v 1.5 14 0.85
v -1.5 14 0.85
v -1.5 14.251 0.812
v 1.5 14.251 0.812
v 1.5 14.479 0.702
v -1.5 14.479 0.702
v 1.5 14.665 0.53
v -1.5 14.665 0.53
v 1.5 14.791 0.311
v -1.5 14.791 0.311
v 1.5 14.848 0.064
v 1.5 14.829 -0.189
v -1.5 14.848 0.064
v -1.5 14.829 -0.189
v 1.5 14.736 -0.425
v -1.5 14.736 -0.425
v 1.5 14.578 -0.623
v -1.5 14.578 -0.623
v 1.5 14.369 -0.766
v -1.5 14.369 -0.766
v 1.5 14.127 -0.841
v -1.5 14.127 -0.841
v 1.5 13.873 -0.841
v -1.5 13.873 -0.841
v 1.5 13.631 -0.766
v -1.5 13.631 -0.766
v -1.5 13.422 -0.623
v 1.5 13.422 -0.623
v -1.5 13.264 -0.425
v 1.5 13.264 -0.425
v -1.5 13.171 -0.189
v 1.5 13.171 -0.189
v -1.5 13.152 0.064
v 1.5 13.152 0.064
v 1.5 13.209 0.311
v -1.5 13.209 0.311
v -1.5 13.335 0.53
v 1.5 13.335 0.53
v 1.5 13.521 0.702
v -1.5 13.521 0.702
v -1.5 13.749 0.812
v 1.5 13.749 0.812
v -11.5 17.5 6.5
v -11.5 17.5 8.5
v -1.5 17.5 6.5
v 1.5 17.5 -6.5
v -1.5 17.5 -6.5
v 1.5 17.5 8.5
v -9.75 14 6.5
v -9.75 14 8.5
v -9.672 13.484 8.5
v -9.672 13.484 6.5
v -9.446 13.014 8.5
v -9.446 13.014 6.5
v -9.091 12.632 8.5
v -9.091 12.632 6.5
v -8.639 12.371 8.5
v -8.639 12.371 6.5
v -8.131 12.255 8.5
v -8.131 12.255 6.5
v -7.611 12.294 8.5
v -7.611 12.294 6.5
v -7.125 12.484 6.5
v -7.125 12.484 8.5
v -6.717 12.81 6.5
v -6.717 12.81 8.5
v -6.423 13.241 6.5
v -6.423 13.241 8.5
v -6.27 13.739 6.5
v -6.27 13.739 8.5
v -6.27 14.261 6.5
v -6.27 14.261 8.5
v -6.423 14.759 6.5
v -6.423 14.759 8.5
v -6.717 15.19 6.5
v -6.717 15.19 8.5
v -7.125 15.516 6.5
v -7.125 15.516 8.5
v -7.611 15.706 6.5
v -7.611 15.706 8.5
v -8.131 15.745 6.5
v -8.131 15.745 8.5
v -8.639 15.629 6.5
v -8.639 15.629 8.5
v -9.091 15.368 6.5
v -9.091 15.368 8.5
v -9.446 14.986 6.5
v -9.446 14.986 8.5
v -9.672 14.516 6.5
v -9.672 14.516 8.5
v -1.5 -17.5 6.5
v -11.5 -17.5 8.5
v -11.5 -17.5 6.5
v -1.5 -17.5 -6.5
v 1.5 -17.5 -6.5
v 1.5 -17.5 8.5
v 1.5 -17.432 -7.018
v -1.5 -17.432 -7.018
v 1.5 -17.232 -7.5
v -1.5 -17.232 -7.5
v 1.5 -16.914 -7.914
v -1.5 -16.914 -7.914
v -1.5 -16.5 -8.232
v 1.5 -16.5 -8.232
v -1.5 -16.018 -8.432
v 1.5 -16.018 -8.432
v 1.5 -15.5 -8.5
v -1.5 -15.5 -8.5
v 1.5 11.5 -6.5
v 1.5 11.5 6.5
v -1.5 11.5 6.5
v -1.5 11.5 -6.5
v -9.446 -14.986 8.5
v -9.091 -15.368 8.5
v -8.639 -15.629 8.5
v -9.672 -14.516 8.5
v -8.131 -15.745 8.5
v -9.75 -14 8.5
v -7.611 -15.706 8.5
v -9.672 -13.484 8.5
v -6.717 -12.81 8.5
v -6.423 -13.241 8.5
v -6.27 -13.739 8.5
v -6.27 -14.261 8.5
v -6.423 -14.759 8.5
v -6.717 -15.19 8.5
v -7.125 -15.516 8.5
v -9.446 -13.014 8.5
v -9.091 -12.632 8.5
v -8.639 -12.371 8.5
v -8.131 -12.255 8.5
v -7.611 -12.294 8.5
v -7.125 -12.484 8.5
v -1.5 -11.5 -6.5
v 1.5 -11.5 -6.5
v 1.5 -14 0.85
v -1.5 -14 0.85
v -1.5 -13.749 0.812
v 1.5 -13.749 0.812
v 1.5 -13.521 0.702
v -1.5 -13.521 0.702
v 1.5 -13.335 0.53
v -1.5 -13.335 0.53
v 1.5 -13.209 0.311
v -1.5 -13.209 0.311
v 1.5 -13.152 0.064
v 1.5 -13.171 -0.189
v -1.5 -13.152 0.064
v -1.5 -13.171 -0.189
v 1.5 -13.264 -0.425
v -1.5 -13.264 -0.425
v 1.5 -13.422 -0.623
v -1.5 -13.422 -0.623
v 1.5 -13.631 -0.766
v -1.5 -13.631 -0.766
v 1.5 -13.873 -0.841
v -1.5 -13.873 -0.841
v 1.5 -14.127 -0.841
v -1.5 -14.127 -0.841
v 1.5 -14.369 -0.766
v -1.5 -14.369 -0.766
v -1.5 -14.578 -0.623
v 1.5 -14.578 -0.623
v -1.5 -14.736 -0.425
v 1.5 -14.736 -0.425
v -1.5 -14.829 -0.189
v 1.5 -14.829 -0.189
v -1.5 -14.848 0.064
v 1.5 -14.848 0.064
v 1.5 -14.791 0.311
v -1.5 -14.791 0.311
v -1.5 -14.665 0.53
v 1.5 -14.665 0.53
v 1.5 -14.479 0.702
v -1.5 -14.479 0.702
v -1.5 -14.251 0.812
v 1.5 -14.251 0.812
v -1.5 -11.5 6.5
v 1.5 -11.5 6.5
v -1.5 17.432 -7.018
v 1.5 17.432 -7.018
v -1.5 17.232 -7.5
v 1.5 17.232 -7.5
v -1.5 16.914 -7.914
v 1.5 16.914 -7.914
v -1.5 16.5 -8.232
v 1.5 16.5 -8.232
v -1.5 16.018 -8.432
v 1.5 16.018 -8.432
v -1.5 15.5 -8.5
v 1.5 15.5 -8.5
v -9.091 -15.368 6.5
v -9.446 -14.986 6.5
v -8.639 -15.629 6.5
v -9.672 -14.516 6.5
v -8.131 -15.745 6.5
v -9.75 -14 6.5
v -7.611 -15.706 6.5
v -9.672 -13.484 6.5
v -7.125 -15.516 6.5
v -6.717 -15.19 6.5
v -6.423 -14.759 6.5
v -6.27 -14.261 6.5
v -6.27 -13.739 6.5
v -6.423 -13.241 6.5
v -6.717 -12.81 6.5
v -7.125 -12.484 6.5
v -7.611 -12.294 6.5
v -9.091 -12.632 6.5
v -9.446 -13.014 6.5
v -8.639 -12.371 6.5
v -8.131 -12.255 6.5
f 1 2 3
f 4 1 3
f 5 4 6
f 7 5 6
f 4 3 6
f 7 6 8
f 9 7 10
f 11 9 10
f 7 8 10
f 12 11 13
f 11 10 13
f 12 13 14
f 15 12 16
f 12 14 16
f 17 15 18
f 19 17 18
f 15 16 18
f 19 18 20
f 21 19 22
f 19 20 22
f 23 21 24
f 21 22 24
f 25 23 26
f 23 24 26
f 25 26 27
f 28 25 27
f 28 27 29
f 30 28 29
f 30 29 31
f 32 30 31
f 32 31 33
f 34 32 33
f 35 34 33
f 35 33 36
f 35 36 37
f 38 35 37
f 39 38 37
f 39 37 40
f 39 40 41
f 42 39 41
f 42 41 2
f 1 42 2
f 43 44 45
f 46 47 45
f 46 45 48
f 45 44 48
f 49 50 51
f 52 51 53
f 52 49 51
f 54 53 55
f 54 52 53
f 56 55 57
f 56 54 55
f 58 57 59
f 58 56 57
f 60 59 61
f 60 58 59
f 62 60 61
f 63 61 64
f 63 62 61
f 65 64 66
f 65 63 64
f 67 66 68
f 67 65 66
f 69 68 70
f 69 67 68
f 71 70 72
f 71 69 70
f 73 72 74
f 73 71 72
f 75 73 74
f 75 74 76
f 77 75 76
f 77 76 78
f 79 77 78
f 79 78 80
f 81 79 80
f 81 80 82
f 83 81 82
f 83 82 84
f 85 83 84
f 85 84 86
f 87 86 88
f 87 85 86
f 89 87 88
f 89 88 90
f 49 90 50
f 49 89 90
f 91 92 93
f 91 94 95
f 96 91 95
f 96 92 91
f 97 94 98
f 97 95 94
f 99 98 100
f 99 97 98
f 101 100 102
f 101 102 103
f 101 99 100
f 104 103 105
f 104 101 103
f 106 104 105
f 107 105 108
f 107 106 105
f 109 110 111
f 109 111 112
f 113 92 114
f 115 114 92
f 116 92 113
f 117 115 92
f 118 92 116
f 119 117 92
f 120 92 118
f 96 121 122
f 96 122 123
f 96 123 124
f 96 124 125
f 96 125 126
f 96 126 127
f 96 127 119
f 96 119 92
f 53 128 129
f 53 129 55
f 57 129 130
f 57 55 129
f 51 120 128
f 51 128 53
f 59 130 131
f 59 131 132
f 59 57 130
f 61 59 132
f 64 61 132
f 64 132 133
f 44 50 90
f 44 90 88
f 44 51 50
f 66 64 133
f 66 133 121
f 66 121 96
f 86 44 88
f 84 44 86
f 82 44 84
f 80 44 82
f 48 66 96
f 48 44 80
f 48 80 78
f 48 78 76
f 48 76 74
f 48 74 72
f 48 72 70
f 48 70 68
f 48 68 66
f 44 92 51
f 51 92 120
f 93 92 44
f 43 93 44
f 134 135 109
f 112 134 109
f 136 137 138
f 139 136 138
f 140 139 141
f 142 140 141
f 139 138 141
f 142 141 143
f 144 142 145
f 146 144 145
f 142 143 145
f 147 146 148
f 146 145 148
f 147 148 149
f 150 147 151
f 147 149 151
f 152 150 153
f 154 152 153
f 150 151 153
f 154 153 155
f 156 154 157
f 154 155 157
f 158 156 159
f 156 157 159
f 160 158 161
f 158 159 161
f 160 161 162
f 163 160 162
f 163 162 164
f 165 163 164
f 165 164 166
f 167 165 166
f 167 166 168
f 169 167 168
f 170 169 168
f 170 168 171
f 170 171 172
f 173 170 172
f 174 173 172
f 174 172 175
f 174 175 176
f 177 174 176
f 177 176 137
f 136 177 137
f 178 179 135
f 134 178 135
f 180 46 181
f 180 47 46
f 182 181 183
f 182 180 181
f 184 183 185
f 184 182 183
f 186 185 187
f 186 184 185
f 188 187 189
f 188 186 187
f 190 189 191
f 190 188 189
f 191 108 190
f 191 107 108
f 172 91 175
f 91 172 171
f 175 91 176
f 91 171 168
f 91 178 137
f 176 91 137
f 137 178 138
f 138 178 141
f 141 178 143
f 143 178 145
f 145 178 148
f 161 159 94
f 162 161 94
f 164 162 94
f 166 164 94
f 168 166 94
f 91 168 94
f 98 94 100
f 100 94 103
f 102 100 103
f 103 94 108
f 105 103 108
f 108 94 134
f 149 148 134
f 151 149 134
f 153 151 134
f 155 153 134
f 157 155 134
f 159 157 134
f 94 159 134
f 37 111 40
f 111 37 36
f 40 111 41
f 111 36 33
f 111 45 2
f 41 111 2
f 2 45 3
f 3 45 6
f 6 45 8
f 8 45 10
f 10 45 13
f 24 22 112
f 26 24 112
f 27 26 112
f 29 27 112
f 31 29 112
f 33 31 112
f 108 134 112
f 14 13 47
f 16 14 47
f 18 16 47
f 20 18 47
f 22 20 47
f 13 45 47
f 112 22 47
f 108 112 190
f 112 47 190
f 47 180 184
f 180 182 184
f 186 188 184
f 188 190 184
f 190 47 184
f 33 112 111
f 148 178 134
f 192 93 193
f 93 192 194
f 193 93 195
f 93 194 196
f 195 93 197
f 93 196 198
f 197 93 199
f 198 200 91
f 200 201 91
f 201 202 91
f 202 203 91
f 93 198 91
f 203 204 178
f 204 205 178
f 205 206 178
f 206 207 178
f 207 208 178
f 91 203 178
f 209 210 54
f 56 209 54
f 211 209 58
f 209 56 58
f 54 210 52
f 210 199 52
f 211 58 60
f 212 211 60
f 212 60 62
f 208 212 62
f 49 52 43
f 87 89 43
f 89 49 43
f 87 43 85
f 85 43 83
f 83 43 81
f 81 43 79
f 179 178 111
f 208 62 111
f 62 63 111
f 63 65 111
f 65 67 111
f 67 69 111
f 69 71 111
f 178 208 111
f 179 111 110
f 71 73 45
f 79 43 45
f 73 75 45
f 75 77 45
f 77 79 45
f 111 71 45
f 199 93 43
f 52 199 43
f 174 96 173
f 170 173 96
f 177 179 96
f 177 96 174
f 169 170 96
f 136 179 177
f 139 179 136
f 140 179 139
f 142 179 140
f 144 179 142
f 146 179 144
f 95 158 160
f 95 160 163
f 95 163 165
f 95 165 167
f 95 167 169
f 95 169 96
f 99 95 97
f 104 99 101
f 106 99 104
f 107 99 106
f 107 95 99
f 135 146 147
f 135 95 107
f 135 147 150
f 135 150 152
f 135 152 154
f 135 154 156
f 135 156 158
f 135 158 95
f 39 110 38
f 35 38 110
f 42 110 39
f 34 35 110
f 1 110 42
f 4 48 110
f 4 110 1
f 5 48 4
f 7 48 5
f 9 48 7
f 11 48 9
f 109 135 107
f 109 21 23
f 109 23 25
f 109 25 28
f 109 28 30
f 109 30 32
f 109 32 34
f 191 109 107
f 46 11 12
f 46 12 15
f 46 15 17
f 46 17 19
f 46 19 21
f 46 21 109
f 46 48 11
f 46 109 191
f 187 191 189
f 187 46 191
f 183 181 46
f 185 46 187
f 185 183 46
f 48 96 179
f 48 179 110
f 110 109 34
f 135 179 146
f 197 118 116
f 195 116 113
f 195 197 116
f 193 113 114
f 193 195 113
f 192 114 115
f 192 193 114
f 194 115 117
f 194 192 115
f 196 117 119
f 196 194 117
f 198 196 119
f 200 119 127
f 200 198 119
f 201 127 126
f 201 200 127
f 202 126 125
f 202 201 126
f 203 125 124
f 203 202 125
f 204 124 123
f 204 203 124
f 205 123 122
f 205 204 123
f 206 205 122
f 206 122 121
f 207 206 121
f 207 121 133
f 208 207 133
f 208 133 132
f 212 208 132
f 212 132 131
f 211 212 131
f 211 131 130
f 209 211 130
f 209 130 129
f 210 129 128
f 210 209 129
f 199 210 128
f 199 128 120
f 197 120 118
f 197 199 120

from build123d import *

# Parameters (mm, degrees)
ESBO_O1_W                = 17
ESBO_O1_H                = 35
RESSALTO_EXTRUS_O1_DEPTH = 1.5
CORTE_EXTRUS_O1_REACH    = 21.685
ESBO_O2_W                = 13
ESBO_O2_H                = 23
CORTE_EXTRUS_O2_REACH    = 21.685
ESBO_O3_R                = 0.85
FILETE1_R                = 2
ESBO_O5_W                = 13
ESBO_O5_H                = 35
RESSALTO_EXTRUS_O2_DEPTH = 2
CORTE_EXTRUS_O3_REACH    = 27.758
ESBO_O6_R                = 1.75


with BuildPart() as part:
    # Esboço1 → Ressalto-extrusão1 (new, symmetric)
    with BuildSketch(Plane(origin=(0, 0, 0), x_dir=(0, 0, -1), z_dir=(1, 0, 0))):
        Rectangle(ESBO_O1_W, ESBO_O1_H)
    extrude(amount=RESSALTO_EXTRUS_O1_DEPTH, both=True)

    # Esboço2 → Corte-extrusão1 (cut, up to next)
    with BuildSketch(Plane(origin=(1.5, 0, 0), x_dir=(0, 0, -1), z_dir=(1, 0, 0)), mode=Mode.PRIVATE) as corte_extrus_o1_sk1:
        Rectangle(ESBO_O2_W, ESBO_O2_H)
    corte_extrus_o1_tool1 = extrude(corte_extrus_o1_sk1.sketch, amount=-CORTE_EXTRUS_O1_REACH, mode=Mode.PRIVATE) & part.part
    add(corte_extrus_o1_tool1.solids().sort_by_distance((1.5, 0, 0))[0], mode=Mode.SUBTRACT)

    # Esboço3 → Corte-extrusão2 (cut, up to next)
    with BuildSketch(Plane.ZY.offset(1.5), mode=Mode.PRIVATE) as corte_extrus_o2_sk1:
        with Locations((0, 14)):
            Circle(ESBO_O3_R)
    corte_extrus_o2_tool1 = extrude(corte_extrus_o2_sk1.sketch, amount=-CORTE_EXTRUS_O2_REACH, mode=Mode.PRIVATE) & part.part
    # Esboço3 → Corte-extrusão2 (cut, up to next)
    with BuildSketch(Plane.ZY.offset(1.5), mode=Mode.PRIVATE) as corte_extrus_o2_sk2:
        with Locations((0, -14)):
            Circle(ESBO_O3_R)
    corte_extrus_o2_tool2 = extrude(corte_extrus_o2_sk2.sketch, amount=-CORTE_EXTRUS_O2_REACH, mode=Mode.PRIVATE) & part.part
    add(corte_extrus_o2_tool1.solids().sort_by_distance((-1.5, 14, 0))[0], mode=Mode.SUBTRACT)
    add(corte_extrus_o2_tool2.solids().sort_by_distance((-1.5, -14, 0))[0], mode=Mode.SUBTRACT)

    # Filete1
    filete1_edges = [part.edges().sort_by_distance(p)[0] for p in [
        (0, -17.5, -8.5),
        (0, 17.5, -8.5),
    ]]
    fillet(filete1_edges, radius=FILETE1_R)

    # Esboço5 → Ressalto-extrusão2 (add)
    with BuildSketch(Plane.XY.offset(8.5)):
        with Locations((-5, 0)):
            Rectangle(ESBO_O5_W, ESBO_O5_H)
    extrude(amount=-RESSALTO_EXTRUS_O2_DEPTH)

    # Esboço6 → Corte-extrusão3 (cut, up to next)
    with BuildSketch(Plane.XY.offset(6.5), mode=Mode.PRIVATE) as corte_extrus_o3_sk1:
        with Locations(Location((-8, 14, 0), (0, 0, 180))):
            Circle(ESBO_O6_R)
    corte_extrus_o3_tool1 = extrude(corte_extrus_o3_sk1.sketch, amount=CORTE_EXTRUS_O3_REACH, mode=Mode.PRIVATE) & part.part
    # Esboço6 → Corte-extrusão3 (cut, up to next)
    with BuildSketch(Plane.XY.offset(6.5), mode=Mode.PRIVATE) as corte_extrus_o3_sk2:
        with Locations(Location((-8, -14, 0), (0, 0, 180))):
            Circle(ESBO_O6_R)
    corte_extrus_o3_tool2 = extrude(corte_extrus_o3_sk2.sketch, amount=CORTE_EXTRUS_O3_REACH, mode=Mode.PRIVATE) & part.part
    add(corte_extrus_o3_tool1.solids().sort_by_distance((-8, 14, 6.5))[0], mode=Mode.SUBTRACT)
    add(corte_extrus_o3_tool2.solids().sort_by_distance((-8, -14, 6.5))[0], mode=Mode.SUBTRACT)


solid = part.part
